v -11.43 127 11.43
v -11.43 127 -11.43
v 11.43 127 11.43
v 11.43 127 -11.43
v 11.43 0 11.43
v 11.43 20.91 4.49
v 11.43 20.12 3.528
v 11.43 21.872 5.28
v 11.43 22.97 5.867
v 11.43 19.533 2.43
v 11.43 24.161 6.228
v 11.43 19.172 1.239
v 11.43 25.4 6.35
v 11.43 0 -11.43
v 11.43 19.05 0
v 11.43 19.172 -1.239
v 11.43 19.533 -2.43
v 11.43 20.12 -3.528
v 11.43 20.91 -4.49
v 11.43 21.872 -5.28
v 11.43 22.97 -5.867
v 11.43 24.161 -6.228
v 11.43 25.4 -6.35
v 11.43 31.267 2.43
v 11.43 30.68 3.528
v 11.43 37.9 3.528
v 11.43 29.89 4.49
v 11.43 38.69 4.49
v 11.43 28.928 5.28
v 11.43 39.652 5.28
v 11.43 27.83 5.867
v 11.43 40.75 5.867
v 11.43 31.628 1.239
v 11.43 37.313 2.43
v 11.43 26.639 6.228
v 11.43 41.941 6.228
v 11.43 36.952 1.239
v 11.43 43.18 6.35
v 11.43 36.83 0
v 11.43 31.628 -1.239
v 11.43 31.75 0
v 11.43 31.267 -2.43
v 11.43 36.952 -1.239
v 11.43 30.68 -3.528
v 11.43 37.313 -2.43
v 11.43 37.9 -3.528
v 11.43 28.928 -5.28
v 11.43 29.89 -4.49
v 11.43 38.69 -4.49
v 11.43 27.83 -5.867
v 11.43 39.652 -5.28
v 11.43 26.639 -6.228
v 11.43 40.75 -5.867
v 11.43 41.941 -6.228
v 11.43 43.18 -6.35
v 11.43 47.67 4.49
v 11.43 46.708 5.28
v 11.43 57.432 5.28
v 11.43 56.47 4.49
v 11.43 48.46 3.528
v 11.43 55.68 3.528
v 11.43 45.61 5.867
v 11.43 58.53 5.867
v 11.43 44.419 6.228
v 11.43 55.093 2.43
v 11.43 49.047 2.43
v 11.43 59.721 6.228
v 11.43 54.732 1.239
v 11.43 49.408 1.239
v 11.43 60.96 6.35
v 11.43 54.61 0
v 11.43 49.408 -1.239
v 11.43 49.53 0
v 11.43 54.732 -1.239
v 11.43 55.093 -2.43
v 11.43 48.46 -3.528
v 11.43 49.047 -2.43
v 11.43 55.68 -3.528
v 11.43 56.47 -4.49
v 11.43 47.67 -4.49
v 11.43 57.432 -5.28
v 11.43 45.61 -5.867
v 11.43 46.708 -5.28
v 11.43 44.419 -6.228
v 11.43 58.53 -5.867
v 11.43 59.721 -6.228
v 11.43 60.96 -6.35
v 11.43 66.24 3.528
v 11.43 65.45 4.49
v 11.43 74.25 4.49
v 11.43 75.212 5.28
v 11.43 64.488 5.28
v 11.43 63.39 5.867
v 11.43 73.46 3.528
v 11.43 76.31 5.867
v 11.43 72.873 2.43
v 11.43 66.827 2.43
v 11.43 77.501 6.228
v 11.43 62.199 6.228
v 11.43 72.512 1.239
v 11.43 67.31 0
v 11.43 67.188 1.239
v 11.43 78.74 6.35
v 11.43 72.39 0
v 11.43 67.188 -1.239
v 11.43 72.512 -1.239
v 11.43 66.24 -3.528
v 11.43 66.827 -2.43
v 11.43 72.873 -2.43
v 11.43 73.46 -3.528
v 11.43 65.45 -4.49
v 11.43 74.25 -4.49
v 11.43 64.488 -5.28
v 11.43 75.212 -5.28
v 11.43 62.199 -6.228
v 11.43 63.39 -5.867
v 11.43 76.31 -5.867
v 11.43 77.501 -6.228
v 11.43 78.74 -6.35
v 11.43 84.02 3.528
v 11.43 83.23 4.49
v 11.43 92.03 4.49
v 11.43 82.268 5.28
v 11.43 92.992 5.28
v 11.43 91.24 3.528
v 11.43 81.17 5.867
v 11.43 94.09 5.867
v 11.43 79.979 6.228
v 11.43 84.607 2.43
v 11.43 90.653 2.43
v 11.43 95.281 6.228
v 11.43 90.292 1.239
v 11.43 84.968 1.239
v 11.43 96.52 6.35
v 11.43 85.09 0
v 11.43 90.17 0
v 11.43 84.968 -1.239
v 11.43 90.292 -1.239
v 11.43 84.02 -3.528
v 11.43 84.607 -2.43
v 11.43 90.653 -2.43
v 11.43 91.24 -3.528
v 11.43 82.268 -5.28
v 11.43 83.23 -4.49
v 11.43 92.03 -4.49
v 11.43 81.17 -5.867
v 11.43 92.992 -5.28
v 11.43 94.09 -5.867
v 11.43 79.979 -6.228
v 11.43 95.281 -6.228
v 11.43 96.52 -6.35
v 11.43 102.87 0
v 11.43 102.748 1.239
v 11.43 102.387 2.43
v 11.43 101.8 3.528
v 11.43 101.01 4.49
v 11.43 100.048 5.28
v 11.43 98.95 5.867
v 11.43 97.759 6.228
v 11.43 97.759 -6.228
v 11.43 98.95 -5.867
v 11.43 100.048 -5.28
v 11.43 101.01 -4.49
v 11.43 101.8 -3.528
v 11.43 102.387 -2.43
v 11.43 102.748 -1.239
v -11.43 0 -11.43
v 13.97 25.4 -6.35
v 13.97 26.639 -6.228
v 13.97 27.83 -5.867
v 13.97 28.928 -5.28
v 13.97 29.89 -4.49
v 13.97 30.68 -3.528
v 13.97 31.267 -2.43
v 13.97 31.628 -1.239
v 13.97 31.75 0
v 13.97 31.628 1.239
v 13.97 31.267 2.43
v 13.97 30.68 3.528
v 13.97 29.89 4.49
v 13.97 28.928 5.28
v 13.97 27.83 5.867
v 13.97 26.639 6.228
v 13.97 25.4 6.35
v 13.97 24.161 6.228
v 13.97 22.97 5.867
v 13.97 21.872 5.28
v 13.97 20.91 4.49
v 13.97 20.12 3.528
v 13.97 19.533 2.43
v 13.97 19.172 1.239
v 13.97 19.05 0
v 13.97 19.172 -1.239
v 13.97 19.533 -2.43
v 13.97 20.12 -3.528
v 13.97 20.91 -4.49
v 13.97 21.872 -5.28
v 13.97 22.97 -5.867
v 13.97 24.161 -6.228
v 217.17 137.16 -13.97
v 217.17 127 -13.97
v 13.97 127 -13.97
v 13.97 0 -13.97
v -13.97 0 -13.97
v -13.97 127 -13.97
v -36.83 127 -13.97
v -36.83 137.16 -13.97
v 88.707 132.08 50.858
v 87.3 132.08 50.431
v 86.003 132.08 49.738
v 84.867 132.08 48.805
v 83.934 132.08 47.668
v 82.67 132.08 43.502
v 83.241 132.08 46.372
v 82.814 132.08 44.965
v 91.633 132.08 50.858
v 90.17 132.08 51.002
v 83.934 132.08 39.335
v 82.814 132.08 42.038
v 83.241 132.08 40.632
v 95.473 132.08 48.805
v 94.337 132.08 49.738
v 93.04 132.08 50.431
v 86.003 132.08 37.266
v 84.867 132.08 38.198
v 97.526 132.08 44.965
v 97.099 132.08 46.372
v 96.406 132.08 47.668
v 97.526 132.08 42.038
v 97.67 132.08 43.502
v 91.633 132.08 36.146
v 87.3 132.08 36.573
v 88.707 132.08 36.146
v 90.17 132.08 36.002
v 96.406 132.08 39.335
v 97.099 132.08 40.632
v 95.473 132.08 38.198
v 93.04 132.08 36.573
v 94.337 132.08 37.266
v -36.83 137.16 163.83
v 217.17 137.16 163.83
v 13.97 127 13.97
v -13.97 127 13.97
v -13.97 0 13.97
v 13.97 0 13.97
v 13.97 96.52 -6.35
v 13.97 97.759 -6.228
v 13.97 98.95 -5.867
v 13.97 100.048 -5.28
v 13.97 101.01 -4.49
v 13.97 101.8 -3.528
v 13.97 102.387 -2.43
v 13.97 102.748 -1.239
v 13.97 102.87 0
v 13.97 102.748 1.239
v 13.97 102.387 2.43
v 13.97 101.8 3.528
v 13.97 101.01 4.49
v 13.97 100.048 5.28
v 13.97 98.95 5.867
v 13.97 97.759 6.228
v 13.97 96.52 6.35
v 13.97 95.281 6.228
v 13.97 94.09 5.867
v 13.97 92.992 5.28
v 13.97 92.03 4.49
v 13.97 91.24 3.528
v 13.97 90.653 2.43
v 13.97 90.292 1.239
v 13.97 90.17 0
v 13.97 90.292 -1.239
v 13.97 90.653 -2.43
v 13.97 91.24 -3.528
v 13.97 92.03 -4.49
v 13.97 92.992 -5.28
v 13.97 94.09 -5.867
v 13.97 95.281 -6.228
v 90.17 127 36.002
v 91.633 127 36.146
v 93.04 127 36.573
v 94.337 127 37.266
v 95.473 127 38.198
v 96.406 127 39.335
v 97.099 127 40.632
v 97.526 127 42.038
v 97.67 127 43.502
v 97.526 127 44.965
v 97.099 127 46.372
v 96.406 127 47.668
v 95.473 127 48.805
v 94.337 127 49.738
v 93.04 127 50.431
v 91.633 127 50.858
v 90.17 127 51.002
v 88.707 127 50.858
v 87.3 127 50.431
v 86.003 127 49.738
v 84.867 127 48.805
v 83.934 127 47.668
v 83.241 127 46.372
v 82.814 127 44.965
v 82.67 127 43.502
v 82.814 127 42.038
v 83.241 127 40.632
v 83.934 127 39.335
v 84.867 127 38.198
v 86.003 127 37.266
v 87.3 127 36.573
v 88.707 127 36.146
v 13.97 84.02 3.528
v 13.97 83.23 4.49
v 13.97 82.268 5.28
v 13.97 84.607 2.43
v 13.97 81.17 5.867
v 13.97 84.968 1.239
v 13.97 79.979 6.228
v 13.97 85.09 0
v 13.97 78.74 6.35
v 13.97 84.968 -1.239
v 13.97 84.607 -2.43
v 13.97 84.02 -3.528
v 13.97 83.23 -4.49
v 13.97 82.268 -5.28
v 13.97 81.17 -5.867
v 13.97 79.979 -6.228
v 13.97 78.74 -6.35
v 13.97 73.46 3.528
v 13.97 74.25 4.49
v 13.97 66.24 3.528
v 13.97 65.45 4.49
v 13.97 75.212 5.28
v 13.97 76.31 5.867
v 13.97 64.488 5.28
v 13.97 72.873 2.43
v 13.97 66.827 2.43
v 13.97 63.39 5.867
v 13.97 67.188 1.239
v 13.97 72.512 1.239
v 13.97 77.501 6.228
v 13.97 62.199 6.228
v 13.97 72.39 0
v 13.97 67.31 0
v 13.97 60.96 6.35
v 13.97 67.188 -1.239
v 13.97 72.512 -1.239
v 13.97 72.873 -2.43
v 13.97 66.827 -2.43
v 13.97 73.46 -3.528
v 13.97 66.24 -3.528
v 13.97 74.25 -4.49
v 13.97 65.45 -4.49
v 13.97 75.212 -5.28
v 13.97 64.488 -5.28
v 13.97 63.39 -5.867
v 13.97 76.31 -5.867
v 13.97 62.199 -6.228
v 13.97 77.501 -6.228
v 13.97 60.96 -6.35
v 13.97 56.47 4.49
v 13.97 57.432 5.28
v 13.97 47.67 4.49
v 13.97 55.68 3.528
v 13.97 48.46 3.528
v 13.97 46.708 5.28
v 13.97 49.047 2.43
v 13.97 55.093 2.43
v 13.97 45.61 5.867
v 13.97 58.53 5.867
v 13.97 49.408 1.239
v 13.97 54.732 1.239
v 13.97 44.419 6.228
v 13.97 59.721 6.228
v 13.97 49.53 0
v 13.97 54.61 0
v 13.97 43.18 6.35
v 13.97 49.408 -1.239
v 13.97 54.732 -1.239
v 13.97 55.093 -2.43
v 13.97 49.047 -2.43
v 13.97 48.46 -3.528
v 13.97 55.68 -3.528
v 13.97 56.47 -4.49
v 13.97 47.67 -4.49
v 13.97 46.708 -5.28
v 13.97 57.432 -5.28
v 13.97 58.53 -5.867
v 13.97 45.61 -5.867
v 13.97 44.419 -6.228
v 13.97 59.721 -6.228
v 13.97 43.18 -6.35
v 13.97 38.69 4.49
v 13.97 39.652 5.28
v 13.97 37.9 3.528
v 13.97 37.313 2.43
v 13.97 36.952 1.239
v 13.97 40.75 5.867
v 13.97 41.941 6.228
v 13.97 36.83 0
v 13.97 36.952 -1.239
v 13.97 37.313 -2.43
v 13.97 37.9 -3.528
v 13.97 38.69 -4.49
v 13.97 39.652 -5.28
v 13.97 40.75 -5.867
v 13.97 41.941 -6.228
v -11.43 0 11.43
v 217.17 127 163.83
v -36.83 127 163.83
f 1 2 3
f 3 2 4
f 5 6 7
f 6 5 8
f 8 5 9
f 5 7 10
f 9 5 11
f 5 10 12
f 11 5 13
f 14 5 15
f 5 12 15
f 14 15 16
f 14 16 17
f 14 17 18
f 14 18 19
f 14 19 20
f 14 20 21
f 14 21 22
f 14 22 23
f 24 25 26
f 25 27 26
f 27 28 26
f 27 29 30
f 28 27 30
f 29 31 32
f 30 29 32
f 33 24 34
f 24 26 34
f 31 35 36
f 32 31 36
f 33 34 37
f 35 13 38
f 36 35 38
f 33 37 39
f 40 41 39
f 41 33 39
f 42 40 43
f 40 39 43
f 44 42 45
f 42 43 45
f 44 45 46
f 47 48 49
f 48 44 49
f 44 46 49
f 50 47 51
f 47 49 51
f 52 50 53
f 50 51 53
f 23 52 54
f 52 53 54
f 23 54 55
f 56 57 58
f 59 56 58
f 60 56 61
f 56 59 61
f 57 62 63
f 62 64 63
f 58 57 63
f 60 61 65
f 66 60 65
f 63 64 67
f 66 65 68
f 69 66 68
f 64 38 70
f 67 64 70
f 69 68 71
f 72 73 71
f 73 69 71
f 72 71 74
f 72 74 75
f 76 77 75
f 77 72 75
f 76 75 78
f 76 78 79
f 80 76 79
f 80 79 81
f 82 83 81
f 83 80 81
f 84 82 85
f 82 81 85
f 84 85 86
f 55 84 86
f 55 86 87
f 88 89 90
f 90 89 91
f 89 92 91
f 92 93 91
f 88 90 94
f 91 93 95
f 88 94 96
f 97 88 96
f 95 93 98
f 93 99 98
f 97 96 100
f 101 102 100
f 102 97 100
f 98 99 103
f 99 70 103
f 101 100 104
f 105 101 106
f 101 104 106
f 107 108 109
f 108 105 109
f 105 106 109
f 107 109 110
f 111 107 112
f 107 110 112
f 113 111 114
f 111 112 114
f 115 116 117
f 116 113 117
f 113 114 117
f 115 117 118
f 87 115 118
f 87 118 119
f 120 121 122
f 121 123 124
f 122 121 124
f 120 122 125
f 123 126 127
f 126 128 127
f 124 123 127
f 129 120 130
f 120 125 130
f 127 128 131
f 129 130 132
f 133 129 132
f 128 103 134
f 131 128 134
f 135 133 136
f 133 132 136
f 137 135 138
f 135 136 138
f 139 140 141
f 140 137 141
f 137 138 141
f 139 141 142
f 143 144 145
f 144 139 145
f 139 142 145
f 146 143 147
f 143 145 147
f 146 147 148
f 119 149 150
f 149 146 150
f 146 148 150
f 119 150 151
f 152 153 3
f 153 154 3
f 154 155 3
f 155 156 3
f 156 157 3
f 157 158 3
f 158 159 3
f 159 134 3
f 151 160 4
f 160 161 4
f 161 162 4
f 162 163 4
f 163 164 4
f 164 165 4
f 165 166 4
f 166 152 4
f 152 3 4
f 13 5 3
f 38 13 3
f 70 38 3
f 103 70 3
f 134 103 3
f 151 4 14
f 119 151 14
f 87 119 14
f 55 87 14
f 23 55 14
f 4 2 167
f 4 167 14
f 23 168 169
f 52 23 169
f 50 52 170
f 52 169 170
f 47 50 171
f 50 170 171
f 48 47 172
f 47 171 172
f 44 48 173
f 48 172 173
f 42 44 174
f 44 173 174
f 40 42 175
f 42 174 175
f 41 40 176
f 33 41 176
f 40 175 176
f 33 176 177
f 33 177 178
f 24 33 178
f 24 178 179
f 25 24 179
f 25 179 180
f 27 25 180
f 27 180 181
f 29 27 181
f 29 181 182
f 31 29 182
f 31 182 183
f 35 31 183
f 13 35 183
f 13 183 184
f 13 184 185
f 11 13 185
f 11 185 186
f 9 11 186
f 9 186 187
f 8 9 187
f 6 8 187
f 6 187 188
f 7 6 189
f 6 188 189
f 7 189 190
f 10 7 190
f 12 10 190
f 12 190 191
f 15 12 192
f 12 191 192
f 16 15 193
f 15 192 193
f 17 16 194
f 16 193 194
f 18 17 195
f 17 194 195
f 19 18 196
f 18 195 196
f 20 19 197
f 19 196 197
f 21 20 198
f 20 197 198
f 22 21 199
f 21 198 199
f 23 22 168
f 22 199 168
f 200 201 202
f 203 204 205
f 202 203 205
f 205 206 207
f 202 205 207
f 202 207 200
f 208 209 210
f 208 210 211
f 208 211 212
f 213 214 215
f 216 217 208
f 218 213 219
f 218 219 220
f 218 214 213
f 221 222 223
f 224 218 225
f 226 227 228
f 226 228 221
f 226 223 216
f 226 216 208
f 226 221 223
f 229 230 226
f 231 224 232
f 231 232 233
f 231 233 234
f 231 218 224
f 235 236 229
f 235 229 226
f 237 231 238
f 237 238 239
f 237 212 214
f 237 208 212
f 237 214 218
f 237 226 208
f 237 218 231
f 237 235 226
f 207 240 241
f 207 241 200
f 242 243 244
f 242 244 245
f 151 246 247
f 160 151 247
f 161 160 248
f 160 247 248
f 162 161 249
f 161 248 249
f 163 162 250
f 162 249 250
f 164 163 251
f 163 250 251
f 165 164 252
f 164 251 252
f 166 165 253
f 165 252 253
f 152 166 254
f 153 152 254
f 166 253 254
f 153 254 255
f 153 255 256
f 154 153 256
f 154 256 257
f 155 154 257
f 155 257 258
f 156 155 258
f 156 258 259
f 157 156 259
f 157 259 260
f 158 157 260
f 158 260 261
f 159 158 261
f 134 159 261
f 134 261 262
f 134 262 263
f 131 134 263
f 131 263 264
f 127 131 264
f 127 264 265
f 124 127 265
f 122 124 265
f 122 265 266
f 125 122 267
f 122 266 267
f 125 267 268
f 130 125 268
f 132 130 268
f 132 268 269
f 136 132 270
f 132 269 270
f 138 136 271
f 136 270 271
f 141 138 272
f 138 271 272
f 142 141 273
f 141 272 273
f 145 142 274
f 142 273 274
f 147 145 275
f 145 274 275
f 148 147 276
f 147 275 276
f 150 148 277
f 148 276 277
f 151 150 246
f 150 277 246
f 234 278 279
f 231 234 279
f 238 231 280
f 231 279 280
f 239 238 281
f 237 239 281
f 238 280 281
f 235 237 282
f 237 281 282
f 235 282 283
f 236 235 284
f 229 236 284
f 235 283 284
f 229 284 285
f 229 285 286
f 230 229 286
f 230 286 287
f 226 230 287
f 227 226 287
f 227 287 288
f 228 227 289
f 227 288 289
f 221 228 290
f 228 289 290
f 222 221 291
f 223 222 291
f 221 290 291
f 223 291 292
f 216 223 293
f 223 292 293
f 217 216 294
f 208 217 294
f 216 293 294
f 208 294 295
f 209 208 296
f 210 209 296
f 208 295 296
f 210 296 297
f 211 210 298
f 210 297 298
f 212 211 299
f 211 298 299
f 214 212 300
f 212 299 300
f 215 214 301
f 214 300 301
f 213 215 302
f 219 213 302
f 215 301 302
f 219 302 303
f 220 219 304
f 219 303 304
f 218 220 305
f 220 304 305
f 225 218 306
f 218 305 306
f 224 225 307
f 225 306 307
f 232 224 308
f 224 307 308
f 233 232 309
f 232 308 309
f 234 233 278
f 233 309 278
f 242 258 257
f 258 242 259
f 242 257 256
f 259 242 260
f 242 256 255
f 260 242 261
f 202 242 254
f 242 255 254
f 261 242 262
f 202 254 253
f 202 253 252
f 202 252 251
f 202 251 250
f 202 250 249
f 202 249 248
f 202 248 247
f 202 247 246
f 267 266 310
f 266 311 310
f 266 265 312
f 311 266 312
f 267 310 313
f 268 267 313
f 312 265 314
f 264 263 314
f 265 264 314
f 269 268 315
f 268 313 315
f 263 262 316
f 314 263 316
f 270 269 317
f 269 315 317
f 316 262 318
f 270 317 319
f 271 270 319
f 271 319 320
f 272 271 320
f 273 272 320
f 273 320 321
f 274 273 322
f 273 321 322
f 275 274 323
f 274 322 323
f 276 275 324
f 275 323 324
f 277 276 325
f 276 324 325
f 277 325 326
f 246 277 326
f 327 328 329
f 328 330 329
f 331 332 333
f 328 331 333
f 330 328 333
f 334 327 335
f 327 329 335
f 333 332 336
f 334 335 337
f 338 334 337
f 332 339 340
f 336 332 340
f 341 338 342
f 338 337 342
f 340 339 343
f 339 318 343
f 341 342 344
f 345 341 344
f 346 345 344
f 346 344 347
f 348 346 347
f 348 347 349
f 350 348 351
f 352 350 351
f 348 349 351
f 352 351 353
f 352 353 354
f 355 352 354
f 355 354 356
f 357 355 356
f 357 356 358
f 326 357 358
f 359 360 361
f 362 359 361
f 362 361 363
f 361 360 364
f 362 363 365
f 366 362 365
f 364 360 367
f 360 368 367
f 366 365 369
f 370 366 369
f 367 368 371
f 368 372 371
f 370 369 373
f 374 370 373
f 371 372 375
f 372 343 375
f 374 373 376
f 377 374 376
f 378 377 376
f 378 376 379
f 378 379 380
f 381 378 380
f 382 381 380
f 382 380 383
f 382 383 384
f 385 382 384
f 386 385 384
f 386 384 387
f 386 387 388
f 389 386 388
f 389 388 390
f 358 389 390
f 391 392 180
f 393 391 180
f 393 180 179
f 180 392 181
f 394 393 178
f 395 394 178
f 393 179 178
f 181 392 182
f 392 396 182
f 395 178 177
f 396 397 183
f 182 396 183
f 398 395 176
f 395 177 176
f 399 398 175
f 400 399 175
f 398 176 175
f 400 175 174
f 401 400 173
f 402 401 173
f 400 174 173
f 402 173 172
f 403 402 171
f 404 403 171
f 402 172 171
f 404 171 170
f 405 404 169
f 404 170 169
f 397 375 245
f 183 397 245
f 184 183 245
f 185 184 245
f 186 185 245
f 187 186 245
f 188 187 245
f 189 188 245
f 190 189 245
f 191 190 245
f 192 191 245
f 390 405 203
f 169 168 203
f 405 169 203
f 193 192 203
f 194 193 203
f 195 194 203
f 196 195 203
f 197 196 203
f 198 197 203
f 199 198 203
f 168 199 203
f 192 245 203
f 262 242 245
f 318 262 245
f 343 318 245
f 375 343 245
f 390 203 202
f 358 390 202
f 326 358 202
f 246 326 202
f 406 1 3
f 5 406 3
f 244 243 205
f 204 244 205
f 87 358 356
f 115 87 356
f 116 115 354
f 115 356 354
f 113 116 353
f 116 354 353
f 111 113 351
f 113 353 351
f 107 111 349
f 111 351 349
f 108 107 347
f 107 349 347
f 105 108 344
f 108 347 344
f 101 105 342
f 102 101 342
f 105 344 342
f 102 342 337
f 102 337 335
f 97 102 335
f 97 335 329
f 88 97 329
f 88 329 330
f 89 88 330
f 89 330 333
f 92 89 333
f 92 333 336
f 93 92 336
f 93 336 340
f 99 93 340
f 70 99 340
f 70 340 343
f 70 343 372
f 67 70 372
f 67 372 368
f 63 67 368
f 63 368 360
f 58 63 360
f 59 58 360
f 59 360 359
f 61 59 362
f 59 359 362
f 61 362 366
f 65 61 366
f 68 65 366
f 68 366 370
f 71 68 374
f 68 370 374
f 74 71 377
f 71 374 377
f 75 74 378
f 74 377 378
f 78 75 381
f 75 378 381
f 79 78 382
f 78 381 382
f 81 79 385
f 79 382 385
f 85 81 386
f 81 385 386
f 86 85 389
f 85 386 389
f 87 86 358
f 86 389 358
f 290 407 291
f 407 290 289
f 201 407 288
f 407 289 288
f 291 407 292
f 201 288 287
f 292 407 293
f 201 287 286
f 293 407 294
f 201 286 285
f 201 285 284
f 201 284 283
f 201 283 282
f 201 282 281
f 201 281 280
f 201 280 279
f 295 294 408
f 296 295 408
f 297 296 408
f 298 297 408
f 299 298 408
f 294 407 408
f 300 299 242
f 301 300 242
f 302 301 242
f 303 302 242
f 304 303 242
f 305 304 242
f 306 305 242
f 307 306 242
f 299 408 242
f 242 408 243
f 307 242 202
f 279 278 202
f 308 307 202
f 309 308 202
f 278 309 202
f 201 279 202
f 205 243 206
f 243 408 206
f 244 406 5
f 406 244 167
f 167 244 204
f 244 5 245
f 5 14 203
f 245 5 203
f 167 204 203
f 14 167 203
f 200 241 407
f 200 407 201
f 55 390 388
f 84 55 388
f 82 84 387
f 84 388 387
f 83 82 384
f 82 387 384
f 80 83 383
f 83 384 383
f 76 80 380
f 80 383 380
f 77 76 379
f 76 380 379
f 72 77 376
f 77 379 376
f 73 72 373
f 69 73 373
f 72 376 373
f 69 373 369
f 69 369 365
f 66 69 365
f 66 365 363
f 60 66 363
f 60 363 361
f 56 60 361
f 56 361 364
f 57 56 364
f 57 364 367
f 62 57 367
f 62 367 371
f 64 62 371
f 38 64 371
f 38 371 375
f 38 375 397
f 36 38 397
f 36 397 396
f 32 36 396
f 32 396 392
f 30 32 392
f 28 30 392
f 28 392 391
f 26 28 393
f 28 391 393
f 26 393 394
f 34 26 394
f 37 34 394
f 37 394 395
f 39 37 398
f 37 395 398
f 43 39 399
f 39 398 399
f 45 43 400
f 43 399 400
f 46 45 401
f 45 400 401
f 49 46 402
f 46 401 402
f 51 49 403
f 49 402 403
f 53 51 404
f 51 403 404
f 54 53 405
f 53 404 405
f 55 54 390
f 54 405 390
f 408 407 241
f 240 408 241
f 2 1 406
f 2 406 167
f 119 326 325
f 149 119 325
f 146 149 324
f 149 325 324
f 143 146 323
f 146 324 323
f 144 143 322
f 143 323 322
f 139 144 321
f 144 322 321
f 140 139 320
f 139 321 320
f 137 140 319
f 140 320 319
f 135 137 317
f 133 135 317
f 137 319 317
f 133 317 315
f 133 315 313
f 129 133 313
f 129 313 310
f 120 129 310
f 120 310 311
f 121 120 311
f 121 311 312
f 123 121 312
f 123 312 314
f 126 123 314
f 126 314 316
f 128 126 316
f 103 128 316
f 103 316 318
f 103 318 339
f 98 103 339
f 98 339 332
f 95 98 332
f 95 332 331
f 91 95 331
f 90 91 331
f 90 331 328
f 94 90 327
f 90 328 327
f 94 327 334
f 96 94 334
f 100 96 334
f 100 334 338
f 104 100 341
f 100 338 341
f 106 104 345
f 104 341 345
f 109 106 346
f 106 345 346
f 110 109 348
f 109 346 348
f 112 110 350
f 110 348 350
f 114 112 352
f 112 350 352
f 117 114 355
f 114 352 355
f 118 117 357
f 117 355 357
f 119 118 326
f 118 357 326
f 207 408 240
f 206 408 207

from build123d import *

# Parameters (mm, degrees)
SKETCH1_W           = 27.94
SKETCH1_H           = 27.94
BOSS_EXTRUDE1_DEPTH = 127
CUT_EXTRUDE1_REACH  = 130.528
SKETCH2_W           = 22.86
SKETCH2_H           = 22.86
SKETCH3_W           = 50.8
SKETCH3_H           = 177.8
BOSS_EXTRUDE2_DEPTH = 10.16
CUT_EXTRUDE2_REACH  = 221.622
SKETCH4_R           = 6.35
SKETCH5_W           = 177.8
SKETCH5_H           = 10.16
BOSS_EXTRUDE3_DEPTH = 203.2
SKETCH7_R           = 7.5
CUT_EXTRUDE4_DEPTH  = 5.08


with BuildPart() as part:
    # Sketch1 → Boss-Extrude1 (new body)
    with BuildSketch(Plane(origin=(0, 0, 0), x_dir=(1, 0, 0), z_dir=(0, 1, 0))):
        Rectangle(SKETCH1_W, SKETCH1_H)
    extrude(amount=BOSS_EXTRUDE1_DEPTH)

    # Sketch2 → Cut-Extrude1 (cut, up to next)
    with BuildSketch(Plane(origin=(0, 127, 0), x_dir=(1, 0, 0), z_dir=(0, 1, 0)), mode=Mode.PRIVATE) as cut_extrude1_sk1:
        Rectangle(SKETCH2_W, SKETCH2_H)
    cut_extrude1_tool1 = extrude(cut_extrude1_sk1.sketch, amount=-CUT_EXTRUDE1_REACH, mode=Mode.PRIVATE) & part.part
    add(cut_extrude1_tool1.solids().sort_by_distance((0, 127, 0))[0], mode=Mode.SUBTRACT)

    # Sketch3 → Boss-Extrude2 (add)
    with BuildSketch(Plane(origin=(0, 127, 0), x_dir=(1, 0, 0), z_dir=(0, 1, 0))):
        with Locations((-11.43, -74.93)):
            Rectangle(SKETCH3_W, SKETCH3_H)
    extrude(amount=BOSS_EXTRUDE2_DEPTH)

    # Sketch4 → Cut-Extrude2 (cut, up to next)
    with BuildSketch(Plane(origin=(13.97, 0, 0), x_dir=(0, 0, -1), z_dir=(1, 0, 0)), mode=Mode.PRIVATE) as cut_extrude2_sk1:
        with Locations((0, 25.4)):
            Circle(SKETCH4_R)
    cut_extrude2_tool1 = extrude(cut_extrude2_sk1.sketch, amount=-CUT_EXTRUDE2_REACH, mode=Mode.PRIVATE) & part.part
    # Sketch4 → Cut-Extrude2 (cut, up to next)
    with BuildSketch(Plane(origin=(13.97, 0, 0), x_dir=(0, 0, -1), z_dir=(1, 0, 0)), mode=Mode.PRIVATE) as cut_extrude2_sk2:
        with Locations((0, 43.18)):
            Circle(SKETCH4_R)
    cut_extrude2_tool2 = extrude(cut_extrude2_sk2.sketch, amount=-CUT_EXTRUDE2_REACH, mode=Mode.PRIVATE) & part.part
    # Sketch4 → Cut-Extrude2 (cut, up to next)
    with BuildSketch(Plane(origin=(13.97, 0, 0), x_dir=(0, 0, -1), z_dir=(1, 0, 0)), mode=Mode.PRIVATE) as cut_extrude2_sk3:
        with Locations((0, 60.96)):
            Circle(SKETCH4_R)
    cut_extrude2_tool3 = extrude(cut_extrude2_sk3.sketch, amount=-CUT_EXTRUDE2_REACH, mode=Mode.PRIVATE) & part.part
    # Sketch4 → Cut-Extrude2 (cut, up to next)
    with BuildSketch(Plane(origin=(13.97, 0, 0), x_dir=(0, 0, -1), z_dir=(1, 0, 0)), mode=Mode.PRIVATE) as cut_extrude2_sk4:
        with Locations((0, 78.74)):
            Circle(SKETCH4_R)
    cut_extrude2_tool4 = extrude(cut_extrude2_sk4.sketch, amount=-CUT_EXTRUDE2_REACH, mode=Mode.PRIVATE) & part.part
    # Sketch4 → Cut-Extrude2 (cut, up to next)
    with BuildSketch(Plane(origin=(13.97, 0, 0), x_dir=(0, 0, -1), z_dir=(1, 0, 0)), mode=Mode.PRIVATE) as cut_extrude2_sk5:
        with Locations((0, 96.52)):
            Circle(SKETCH4_R)
    cut_extrude2_tool5 = extrude(cut_extrude2_sk5.sketch, amount=-CUT_EXTRUDE2_REACH, mode=Mode.PRIVATE) & part.part
    add(cut_extrude2_tool1.solids().sort_by_distance((13.97, 25.4, 0))[0], mode=Mode.SUBTRACT)
    add(cut_extrude2_tool2.solids().sort_by_distance((13.97, 43.18, 0))[0], mode=Mode.SUBTRACT)
    add(cut_extrude2_tool3.solids().sort_by_distance((13.97, 60.96, 0))[0], mode=Mode.SUBTRACT)
    add(cut_extrude2_tool4.solids().sort_by_distance((13.97, 78.74, 0))[0], mode=Mode.SUBTRACT)
    add(cut_extrude2_tool5.solids().sort_by_distance((13.97, 96.52, 0))[0], mode=Mode.SUBTRACT)

    # Sketch5 → Boss-Extrude3 (add)
    with BuildSketch(Plane(origin=(13.97, 0, 0), x_dir=(0, 0, -1), z_dir=(1, 0, 0))):
        with Locations((-74.93, 132.08)):
            Rectangle(SKETCH5_W, SKETCH5_H)
    extrude(amount=BOSS_EXTRUDE3_DEPTH)

    # Sketch7 → Cut-Extrude4 (cut)
    with BuildSketch(Plane.XZ.offset(-127)):
        with Locations(Location((90.17, 43.501665218, 0), (0, 0, 270))):
            Circle(SKETCH7_R)
    extrude(amount=-CUT_EXTRUDE4_DEPTH, mode=Mode.SUBTRACT)


solid = part.part
